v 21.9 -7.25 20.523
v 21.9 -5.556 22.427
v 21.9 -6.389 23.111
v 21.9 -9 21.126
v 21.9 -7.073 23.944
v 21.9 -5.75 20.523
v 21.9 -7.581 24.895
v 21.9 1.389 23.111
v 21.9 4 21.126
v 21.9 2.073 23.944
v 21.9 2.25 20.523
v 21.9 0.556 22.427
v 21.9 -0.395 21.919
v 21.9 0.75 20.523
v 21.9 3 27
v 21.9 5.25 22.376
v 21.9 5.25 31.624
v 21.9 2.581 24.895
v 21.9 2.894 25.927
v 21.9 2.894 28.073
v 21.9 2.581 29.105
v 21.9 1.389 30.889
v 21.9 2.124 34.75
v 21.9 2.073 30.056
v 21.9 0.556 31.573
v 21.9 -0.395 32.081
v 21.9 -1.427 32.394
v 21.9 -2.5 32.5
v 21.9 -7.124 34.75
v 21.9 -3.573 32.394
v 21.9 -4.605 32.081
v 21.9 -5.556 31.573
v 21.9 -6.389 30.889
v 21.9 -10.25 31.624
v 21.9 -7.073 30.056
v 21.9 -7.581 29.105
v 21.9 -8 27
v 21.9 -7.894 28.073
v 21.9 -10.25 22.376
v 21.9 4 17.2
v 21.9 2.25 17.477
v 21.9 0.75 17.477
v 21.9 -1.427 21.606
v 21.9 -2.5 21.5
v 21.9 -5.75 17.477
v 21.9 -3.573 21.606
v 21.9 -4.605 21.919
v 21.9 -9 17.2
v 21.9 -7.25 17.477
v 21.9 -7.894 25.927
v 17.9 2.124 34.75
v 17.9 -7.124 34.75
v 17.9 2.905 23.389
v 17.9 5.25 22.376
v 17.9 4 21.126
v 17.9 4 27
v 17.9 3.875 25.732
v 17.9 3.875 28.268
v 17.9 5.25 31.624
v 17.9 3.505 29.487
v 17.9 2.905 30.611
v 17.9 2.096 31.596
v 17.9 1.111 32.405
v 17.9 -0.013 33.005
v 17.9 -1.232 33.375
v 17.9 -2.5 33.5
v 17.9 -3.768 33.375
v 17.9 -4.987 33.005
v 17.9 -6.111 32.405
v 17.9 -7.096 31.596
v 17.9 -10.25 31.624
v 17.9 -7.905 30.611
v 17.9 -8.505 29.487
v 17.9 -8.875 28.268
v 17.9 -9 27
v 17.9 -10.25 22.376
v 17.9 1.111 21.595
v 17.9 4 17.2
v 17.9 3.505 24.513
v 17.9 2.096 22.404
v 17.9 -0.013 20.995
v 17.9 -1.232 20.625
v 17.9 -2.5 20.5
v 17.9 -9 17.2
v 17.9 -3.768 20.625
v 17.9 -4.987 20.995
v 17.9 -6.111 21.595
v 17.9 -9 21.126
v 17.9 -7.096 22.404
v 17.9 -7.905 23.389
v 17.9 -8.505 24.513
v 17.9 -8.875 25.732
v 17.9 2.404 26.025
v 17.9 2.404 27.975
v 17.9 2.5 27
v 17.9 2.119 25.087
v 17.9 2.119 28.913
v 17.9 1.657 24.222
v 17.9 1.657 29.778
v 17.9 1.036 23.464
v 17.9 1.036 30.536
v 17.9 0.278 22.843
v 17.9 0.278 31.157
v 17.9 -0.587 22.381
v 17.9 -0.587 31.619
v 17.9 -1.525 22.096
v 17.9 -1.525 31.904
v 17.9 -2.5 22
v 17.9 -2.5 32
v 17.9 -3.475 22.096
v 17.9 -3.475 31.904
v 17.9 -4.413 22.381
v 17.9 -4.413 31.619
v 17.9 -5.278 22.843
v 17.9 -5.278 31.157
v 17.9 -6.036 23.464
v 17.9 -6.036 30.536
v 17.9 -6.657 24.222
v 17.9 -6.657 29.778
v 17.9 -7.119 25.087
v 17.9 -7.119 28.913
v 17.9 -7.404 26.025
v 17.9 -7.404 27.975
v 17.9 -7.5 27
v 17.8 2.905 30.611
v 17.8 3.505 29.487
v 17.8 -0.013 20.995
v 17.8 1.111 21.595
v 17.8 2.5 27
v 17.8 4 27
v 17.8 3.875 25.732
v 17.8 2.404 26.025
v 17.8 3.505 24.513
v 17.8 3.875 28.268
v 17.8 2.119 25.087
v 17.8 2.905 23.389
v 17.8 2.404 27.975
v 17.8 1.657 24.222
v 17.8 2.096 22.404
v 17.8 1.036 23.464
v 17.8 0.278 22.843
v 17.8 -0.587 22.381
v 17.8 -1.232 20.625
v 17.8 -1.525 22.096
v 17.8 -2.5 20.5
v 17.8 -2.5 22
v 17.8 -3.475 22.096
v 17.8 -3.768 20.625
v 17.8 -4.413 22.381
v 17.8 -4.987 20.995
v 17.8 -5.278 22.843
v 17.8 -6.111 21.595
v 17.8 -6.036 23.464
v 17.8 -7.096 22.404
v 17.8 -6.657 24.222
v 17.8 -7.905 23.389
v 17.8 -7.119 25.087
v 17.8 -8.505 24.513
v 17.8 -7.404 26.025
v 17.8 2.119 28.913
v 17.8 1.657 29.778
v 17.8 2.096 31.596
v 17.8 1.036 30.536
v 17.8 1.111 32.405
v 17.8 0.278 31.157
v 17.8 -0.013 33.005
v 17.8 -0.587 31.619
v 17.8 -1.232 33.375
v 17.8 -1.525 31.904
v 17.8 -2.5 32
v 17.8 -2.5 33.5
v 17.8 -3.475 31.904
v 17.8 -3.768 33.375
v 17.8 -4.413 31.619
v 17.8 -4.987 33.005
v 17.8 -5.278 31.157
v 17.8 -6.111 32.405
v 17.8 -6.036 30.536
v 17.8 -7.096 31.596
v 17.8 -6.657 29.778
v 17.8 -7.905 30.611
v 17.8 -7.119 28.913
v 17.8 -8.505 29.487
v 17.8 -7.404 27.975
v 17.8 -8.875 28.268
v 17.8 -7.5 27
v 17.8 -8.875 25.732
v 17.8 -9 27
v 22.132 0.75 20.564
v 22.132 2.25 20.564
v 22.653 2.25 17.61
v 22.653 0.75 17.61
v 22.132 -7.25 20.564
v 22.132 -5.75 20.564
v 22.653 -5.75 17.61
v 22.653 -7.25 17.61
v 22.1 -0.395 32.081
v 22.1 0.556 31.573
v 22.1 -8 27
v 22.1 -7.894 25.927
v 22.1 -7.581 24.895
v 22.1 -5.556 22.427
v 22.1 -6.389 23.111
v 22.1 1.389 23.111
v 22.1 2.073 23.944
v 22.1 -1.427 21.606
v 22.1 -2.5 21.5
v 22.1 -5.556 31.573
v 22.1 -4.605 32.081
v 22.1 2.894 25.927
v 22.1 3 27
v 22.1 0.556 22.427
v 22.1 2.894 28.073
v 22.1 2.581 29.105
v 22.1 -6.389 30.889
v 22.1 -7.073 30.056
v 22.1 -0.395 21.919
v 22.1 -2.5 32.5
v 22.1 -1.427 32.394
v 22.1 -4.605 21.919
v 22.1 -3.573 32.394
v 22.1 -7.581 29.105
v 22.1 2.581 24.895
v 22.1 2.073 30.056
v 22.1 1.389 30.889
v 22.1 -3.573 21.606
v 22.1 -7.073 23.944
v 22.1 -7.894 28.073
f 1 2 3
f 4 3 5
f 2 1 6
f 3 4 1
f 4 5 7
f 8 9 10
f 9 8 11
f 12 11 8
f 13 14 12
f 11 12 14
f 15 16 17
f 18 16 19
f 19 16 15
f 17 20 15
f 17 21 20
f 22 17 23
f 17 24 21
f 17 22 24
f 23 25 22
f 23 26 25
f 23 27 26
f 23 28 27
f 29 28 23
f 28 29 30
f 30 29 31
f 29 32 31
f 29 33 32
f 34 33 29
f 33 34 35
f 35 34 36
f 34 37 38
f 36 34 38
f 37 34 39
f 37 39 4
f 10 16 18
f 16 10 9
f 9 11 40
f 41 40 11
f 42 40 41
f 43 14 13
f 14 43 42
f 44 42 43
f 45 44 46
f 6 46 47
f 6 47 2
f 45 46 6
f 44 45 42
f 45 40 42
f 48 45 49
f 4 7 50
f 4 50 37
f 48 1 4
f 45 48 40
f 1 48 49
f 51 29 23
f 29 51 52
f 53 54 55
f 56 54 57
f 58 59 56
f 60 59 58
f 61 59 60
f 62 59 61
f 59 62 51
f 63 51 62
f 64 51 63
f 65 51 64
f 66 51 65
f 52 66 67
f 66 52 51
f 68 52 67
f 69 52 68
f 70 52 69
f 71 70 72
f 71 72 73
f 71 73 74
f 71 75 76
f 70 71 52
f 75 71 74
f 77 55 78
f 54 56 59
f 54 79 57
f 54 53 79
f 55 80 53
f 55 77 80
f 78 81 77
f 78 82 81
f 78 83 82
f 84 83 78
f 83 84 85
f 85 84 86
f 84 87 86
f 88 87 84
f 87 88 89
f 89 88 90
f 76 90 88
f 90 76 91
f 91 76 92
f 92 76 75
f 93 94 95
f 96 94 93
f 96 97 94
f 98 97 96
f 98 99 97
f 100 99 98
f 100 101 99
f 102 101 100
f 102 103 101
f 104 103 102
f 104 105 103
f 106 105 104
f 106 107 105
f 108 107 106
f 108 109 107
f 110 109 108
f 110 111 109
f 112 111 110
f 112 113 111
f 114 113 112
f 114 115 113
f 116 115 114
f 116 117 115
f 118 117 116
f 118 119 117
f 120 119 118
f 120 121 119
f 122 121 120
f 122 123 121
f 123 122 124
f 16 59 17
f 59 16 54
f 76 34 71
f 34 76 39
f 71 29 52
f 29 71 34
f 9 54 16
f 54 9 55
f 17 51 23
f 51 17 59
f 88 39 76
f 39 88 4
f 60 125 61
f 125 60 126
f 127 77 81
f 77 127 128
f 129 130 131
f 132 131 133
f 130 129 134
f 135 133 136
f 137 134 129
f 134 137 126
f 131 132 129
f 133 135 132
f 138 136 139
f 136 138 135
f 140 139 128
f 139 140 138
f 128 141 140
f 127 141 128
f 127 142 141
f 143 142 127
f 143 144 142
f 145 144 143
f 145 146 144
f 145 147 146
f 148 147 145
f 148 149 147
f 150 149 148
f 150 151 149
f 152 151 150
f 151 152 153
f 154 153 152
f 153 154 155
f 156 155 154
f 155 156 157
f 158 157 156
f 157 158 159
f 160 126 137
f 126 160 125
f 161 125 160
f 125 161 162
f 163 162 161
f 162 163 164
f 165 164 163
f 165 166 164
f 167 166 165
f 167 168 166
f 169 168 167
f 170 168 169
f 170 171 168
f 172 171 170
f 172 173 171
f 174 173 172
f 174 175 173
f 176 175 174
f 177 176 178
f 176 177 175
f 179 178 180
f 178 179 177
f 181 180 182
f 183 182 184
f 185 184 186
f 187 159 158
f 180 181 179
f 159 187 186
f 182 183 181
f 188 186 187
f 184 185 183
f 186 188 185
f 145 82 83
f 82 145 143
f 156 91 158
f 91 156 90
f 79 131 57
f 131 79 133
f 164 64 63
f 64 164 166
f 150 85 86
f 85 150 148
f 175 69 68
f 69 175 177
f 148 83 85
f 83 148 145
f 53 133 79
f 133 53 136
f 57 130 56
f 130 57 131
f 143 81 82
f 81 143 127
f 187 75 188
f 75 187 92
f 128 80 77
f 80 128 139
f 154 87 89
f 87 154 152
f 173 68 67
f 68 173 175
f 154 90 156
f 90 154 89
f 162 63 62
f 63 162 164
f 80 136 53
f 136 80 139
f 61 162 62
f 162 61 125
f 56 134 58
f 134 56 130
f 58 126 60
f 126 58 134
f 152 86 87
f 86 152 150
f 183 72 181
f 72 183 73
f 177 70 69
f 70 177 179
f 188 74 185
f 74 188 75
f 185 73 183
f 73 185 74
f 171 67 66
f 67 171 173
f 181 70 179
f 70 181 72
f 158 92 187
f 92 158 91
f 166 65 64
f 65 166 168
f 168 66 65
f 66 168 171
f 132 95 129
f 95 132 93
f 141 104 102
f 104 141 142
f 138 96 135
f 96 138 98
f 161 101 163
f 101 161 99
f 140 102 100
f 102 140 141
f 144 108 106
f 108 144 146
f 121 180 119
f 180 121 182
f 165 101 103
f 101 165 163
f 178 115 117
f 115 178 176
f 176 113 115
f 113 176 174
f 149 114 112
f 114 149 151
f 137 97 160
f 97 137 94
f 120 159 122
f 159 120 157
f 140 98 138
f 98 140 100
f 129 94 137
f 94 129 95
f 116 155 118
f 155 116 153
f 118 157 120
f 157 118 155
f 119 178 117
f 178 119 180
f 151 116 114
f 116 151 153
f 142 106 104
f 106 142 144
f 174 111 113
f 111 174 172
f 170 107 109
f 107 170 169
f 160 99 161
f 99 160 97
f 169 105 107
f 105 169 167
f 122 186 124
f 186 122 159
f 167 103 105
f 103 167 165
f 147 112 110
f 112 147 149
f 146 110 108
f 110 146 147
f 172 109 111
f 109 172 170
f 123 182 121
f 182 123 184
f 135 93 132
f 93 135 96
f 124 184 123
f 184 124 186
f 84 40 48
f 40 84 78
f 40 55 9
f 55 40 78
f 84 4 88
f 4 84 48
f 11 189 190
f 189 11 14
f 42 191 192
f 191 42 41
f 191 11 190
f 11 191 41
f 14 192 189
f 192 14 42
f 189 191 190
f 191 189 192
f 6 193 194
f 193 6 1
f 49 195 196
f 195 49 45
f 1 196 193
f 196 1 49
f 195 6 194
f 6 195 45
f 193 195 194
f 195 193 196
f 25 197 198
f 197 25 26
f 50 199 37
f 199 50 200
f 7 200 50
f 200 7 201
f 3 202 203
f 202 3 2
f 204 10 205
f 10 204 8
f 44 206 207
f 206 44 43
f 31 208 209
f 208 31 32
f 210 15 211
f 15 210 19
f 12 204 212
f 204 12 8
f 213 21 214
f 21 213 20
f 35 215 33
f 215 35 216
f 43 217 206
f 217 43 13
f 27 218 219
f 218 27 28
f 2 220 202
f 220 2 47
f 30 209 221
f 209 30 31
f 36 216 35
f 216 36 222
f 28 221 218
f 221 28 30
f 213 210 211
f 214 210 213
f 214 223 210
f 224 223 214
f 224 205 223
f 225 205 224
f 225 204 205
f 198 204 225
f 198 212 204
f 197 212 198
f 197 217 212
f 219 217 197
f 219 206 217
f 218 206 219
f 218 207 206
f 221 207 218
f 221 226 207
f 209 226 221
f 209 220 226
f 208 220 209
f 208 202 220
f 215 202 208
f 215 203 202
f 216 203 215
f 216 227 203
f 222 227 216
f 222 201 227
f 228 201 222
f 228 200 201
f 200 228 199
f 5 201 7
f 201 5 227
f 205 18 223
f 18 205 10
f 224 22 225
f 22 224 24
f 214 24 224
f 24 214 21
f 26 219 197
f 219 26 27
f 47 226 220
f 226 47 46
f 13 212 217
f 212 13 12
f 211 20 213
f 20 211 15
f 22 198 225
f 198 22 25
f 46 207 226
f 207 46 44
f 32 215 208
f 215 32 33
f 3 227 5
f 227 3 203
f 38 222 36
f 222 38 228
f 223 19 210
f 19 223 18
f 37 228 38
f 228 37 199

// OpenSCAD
$fn=100;

//on_off_switch();

//pi_zero();

//translate ([0,100,0])
//pca9685();

//dc_dc();

//pi_camera();

//imu();

//esp8266();

speaker();



module header(pins, rows){
  color("darkgrey") cube([2.54*pins,2.54*rows,1.27]);
  
  color("gold")
  for(x=[0:pins-1],y=[0:rows-1])
    translate([x*2.54+(1.27+.6)/2,y*2.54+(1.27+.6)/2,-3.5]) cube([0.6,0.6,11.5]);
}


module pi_zero(){
    // PCB
    color("limegreen") difference(){
        hull(){
            translate([-(65-6)/2,-(30-6)/2,0]) cylinder(r=3, h=1.4 );
            translate([-(65-6)/2, (30-6)/2,0]) cylinder(r=3, h=1.4 );
            translate([ (65-6)/2,-(30-6)/2,0]) cylinder(r=3, h=1.4 );
            translate([ (65-6)/2, (30-6)/2,0]) cylinder(r=3, h=1.4 );
        }
        
        translate([-65/2+3.5,-30/2+3.5,-1]) cylinder(d=2.75, h=3);
        translate([-65/2+3.5, 30/2-3.5,-1]) cylinder(d=2.75, h=3);
        translate([65/2-3.5,-30/2+3.5,-1]) cylinder(d=2.75, h=3);
        translate([65/2-3.5, 30/2-3.5,-1]) cylinder(d=2.75, h=3);
    }
    
    // Header
    translate([-10*2.54,30/2-2.54-3.5,1.4])
    header(20,2);
    
    translate([-65/2,-30/2,1.4]){
        color("silver"){
        
            // micro USB
            translate([41-8/2,-1.5,0]) cube([8,6,2.6]);
            translate([54-8/2,-1.5,0]) cube([8,6,2.6]);        
            
            // HDMI
            translate([6.9,-1.5,0]) cube([13,7,3]);
        }
    
        color("darkgrey"){
        
            // Camera
            translate([64-4/2,7.1,0]) cube([4,16,2.5]);
        }
    
        // Micro SD Card
        color("silver") translate([0,8.6,-0]) cube([13,14,1.5]);    
        color("darkgrey") translate([-2.4,10.1,0]) cube([2.4,11,1]);
    }
}



module pca9685(withHeader=true){  
  
    // PCB
    color("limegreen") difference(){
        translate([0,0,0]) hull(){
            translate([-(62.5-6)/2,-(25.4-6)/2,0]) cylinder(r=3, h=1.4 );
            translate([-(62.5-6)/2, (25.4-6)/2,0]) cylinder(r=3, h=1.4 );
            translate([ (62.5-6)/2,-(25.4-6)/2,0]) cylinder(r=3, h=1.4 );
            translate([ (62.5-6)/2, (25.4-6)/2,0]) cylinder(r=3, h=1.4 );
        }
        
        translate([-55.9/2,-18.8/2,-1]) cylinder(d=2.75, h=3);
        translate([-55.9/2, 18.8/2,-1]) cylinder(d=2.75, h=3);
        translate([55.9/2,-18.8/2,-1]) cylinder(d=2.75, h=3);
        translate([55.9/2, 18.8/2,-1]) cylinder(d=2.75, h=3);
    } 
    
    
    // capacitor
    color("silver")
    translate([-(62.5/2)+17.1,(25.4-8.3)/2,1.4])
    cylinder(d=8.3, h=12.7);
    
    //power connector
    color("blue")
    translate([-(62.5/2)+25.1+2.54*2,(25.4-8.3)/2,1.4])
    cube([2.54*2,4,8]);
    
    // Header top
    translate([-(62.5/2)+5.65,-25.4/2,1.4])
    header(4,3);
    
    translate([2.25,-25.4/2,1.4])
    header(4,3);
    
    translate([-2.25-2.54*4,-25.4/2,1.4])
    header(4,3);
    
    translate([62.5/2-5.65-2.54*4,-25.4/2,1.4])
    header(4,3);
    
    translate([62.5/2,-25.4/2+5.08,1.4])
    rotate([0,0,90])
    header(6,1);
    
    translate([-62.5/2+2.54,-25.4/2+5.08,1.4])
    rotate([0,0,90])
    header(6,1);

  
}

module dc_dc(){
    
    // PCB
    color("limegreen") difference(){
        translate([0,0,0]) hull(){
            translate([-(24.5-6)/2,-(48-6)/2,0]) cylinder(r=3, h=1.4 );
            translate([-(24.5-6)/2, (48-6)/2,0]) cylinder(r=3, h=1.4 );
            translate([ (24.5-6)/2,-(48-6)/2,0]) cylinder(r=3, h=1.4 );
            translate([ (24.5-6)/2, (48-6)/2,0]) cylinder(r=3, h=1.4 );
        }
      
        translate([0,0,-1]) {
            
            //translate([-17/2,-35/2,0])
            //cylinder(d=3.15, h=2.5);
            
            translate([-17/2,35/2, 0])
            cylinder(d=3.15, h=2.5);
            
            translate([17/2,-35/2, 0])
            cylinder(d=3.15, h=2.5);
            
            //translate([17/2,35/2, 0])
            //cylinder(d=3.15, h=2.5); 
          
        }


    } 
    
    
    // capacitors
    color("darkblue")
    translate([-(24.5/2)+12.1,(48-8)/2,1.4])
    cylinder(d=8, h=10);
    
    color("darkblue")
    translate([-(24.5/2)+12.1,-(48-8)/2,1.4])
    cylinder(d=8, h=10);
    
    //toroid
    
    difference(){
        
        color("orange")
        translate([(24.5/2)-22.1+9,(48-30)/2,1.4])
        cylinder(d=12, h=7.6);
        
        color("orange")
        translate([(24.5/2)-22.1+9,(48-30)/2,0.5])
        cylinder(d=6, h=11);

        
    }
    
    
    //potentiometer
    color("blue")
    translate([24.5/2-2,-48/2+9,1.4])
    rotate([0,0,90])
    cube([5,10,11]);
    
    
    //IC
    color("black")
    translate([24.5/2-8,-48/2+15,1.4])
    rotate([0,0,90])
    cube([11,11,5]);
    
    
}


module on_off_switch(){
    
    union(){
        
        color("silver")
        translate([-8/2, -4/2, 0])
        cube([8, 4, 3.8]);
        
        color("black")
        translate([-1.5/2, -1.5/2, 3.8])
        cube([1.5, 1.5, 3]);
        
        color("silver")
        translate([-0.5/2, -0.5/2, -3.2])
        cube([0.5, 0.5, 3.2]);
        
        color("silver")
        translate([-0.5/2-2.5, -0.5/2, -3.2])
        cube([0.5, 0.5, 3.2]);
        
        color("silver")
        translate([-0.5/2+2.5, -0.5/2, -3.2])
        cube([0.5, 0.5, 3.2]);
        
        
        
        
    }
    
}


module pi_camera(){
    difference(){
        union(){
            color("limegreen")
            translate([-25.5/2, -24.5/2, 0])
            cube([25.5, 24.5, 0.9]);
            
            
            //camera sensor
            color("darkgrey")
            translate([-8.5/2, -8.5/2+2.4, 0.9])
            cube([8.5, 8.5, 3.5]);
            
            color("darkgrey")
            translate([0, 2.4, 0.9+3.5])
            cylinder(d=8, h=0.75, $fn=32);
        
            color("darkgrey")
            translate([0, 2.4, 0.9+3.5+0.75])
            cylinder(d=6, h=0.75, $fn=32);
            
            color("darkgrey")
            translate([0, 2.4, 0.9+3.5+0.75+0.75])
            cylinder(d1=2, d2=5, h=2, $fn=32);
            
            //sensor connector
            color("orange")
            translate([-8.5/2, -8.5/2+2.4-10.5, 0.9])
            cube([8.5, 10.5, 2.5]);
            
            //led
            color("white")
            translate([-20/2, -8.5/2+2.4-7, 0.9])
            cube([20, 3, 1]);            
            
            
            //connector
            color("white")
            translate([-20.8/2, -5.5+24/2, -2.4])
            cube([20.8, 5.5, 2.4]);
            
            
    
        }
          
        translate([-21/2,-20/2,-1]) cylinder(d=2.1, h=3);
        translate([-21/2, 20/2-7.5,-1]) cylinder(d=2.1, h=3);
        translate([21/2,-20/2,-1]) cylinder(d=2.1, h=3);
        translate([21/2, 20/2-7.5,-1]) cylinder(d=2.1, h=3);
    }
    
    
}

module imu(){
    
        difference(){
        union(){
            color("limegreen")
            translate([-20.5/2, -15.5/2, 0])
            cube([20.5, 15.5, 0.9]);
            
            
            //mpu6050
            color("black")
            translate([-4.5/2, -3.5/2, 0.9])
            cube([4.5, 4.5, 0.5]);
            

            
            
            //led
            //color("white")
            //translate([-20/2, -8.5/2+2.4-7, 0.9])
            //cube([20, 3, 1]);            
            
            
            //connector
            //color("white")
            //translate([-20.8/2, -5.5+24/2, -2.4])
            //cube([20.8, 5.5, 2.4]);
            
            translate([-4*2.54-0.5,-16.5/2,0.45])
            color("gold")
            for(x=[0:8-1],y=[0:1-1])
                translate([x*2.54+(1.27+.6)/2,y*2.54+(1.27+.6)/2,-0.5]) cube([1.6,1.6,1]);
            
            
    
        }
          
       
        translate([-15/2, 25/2-7.5,-1]) cylinder(d=3, h=3);
        translate([15/2, 25/2-7.5,-1]) cylinder(d=3, h=3);
        
        translate([-4*2.54-0.5,-15.5/2,0.45])
        for(x=[0:8-1],y=[0:1-1])
                translate([x*2.54+(1.27+1.2)/2,y*2.54+(1.27)/2,-0.75]) cube([1,1,1.5]);
        

    }
    
}
    


module esp8266(){
    
        difference(){
        union(){
            color("limegreen")
            translate([-20.5/2, -15.5/2, 0])
            cube([20.5, 15.5, 0.9]);
            
            
            //mpu6050
            color("black")
            translate([-4.5/2, -3.5/2, 0.9])
            cube([4.5, 4.5, 0.5]);
            

            
            
            //led
            //color("white")
            //translate([-20/2, -8.5/2+2.4-7, 0.9])
            //cube([20, 3, 1]);            
            
            
            //connector
            //color("white")
            //translate([-20.8/2, -5.5+24/2, -2.4])
            //cube([20.8, 5.5, 2.4]);
            
            translate([-4*2.54-0.5,-16.5/2,0.45])
            color("gold")
            for(x=[0:8-1],y=[0:1-1])
                translate([x*2.54+(1.27+.6)/2,y*2.54+(1.27+.6)/2,-0.5]) cube([1.6,1.6,1]);
            
            translate([-4*2.54-0.5,16.5/2-2.54,0.45])
            color("gold")
            for(x=[0:8-1],y=[0:1-1])
                translate([x*2.54+(1.27+.6)/2,y*2.54+(1.27+.6)/2,-0.5]) cube([1.6,1.6,1]);
            
            
    
        }
          
       
        //translate([-15/2, 25/2-7.5,-1]) cylinder(d=3, h=3);
        //translate([15/2, 25/2-7.5,-1]) cylinder(d=3, h=3);
        
        translate([-4*2.54-0.5,-15.5/2,0.45])
        for(x=[0:8-1],y=[0:1-1])
                translate([x*2.54+(1.27+1.2)/2,y*2.54+(1.27)/2,-0.75]) cube([1,1,1.5]);
        
        translate([-4*2.54-0.5,15.5/2-2.54,0.45])
        for(x=[0:8-1],y=[0:1-1])
                translate([x*2.54+(1.27+1.2)/2,y*2.54+(1.27)/2,-0.75]) cube([1,1,1.5]);
        

    }
    
}


module speaker(){
    
    //ear speakers
    //color("green", 0.4)
    translate([19.9, -2.5, 27]) 
    union(){
        intersection(){
        
     
            cube([4, 15.5, 15.5], center=true);
            
            rotate([45, 0, 0])
            cube([4, 17.5, 17.5], center=true);
            
        }
            
        translate([0, 0, -7.5])
        cube([4, 13, 4.6], center=true);
        
        //connectors
        translate([2, 4, -8])
        rotate([0, -10, 0])
        cube([1, 1.5, 3], center=true);
        
        translate([2, -4, -8])
        rotate([0, -10, 0])
        cube([1, 1.5, 3], center=true);
        
        //speaker magnet
        translate([1.9, 0, 0])
        rotate([0, 90, 0])
        cylinder(d=11, h=0.3, $fn=32);
        
        //speaker cone
        
        difference(){
            
            translate([-2.1, 0, 0])
            rotate([0, 90, 0])
            cylinder(d=13, h=0.2, $fn=32);
            
            translate([-2.2, 0, 0])
            rotate([0, 90, 0])
            cylinder(d=10, h=0.3, $fn=32);
            
            
        }
            
        
    }
    
    
}
    
